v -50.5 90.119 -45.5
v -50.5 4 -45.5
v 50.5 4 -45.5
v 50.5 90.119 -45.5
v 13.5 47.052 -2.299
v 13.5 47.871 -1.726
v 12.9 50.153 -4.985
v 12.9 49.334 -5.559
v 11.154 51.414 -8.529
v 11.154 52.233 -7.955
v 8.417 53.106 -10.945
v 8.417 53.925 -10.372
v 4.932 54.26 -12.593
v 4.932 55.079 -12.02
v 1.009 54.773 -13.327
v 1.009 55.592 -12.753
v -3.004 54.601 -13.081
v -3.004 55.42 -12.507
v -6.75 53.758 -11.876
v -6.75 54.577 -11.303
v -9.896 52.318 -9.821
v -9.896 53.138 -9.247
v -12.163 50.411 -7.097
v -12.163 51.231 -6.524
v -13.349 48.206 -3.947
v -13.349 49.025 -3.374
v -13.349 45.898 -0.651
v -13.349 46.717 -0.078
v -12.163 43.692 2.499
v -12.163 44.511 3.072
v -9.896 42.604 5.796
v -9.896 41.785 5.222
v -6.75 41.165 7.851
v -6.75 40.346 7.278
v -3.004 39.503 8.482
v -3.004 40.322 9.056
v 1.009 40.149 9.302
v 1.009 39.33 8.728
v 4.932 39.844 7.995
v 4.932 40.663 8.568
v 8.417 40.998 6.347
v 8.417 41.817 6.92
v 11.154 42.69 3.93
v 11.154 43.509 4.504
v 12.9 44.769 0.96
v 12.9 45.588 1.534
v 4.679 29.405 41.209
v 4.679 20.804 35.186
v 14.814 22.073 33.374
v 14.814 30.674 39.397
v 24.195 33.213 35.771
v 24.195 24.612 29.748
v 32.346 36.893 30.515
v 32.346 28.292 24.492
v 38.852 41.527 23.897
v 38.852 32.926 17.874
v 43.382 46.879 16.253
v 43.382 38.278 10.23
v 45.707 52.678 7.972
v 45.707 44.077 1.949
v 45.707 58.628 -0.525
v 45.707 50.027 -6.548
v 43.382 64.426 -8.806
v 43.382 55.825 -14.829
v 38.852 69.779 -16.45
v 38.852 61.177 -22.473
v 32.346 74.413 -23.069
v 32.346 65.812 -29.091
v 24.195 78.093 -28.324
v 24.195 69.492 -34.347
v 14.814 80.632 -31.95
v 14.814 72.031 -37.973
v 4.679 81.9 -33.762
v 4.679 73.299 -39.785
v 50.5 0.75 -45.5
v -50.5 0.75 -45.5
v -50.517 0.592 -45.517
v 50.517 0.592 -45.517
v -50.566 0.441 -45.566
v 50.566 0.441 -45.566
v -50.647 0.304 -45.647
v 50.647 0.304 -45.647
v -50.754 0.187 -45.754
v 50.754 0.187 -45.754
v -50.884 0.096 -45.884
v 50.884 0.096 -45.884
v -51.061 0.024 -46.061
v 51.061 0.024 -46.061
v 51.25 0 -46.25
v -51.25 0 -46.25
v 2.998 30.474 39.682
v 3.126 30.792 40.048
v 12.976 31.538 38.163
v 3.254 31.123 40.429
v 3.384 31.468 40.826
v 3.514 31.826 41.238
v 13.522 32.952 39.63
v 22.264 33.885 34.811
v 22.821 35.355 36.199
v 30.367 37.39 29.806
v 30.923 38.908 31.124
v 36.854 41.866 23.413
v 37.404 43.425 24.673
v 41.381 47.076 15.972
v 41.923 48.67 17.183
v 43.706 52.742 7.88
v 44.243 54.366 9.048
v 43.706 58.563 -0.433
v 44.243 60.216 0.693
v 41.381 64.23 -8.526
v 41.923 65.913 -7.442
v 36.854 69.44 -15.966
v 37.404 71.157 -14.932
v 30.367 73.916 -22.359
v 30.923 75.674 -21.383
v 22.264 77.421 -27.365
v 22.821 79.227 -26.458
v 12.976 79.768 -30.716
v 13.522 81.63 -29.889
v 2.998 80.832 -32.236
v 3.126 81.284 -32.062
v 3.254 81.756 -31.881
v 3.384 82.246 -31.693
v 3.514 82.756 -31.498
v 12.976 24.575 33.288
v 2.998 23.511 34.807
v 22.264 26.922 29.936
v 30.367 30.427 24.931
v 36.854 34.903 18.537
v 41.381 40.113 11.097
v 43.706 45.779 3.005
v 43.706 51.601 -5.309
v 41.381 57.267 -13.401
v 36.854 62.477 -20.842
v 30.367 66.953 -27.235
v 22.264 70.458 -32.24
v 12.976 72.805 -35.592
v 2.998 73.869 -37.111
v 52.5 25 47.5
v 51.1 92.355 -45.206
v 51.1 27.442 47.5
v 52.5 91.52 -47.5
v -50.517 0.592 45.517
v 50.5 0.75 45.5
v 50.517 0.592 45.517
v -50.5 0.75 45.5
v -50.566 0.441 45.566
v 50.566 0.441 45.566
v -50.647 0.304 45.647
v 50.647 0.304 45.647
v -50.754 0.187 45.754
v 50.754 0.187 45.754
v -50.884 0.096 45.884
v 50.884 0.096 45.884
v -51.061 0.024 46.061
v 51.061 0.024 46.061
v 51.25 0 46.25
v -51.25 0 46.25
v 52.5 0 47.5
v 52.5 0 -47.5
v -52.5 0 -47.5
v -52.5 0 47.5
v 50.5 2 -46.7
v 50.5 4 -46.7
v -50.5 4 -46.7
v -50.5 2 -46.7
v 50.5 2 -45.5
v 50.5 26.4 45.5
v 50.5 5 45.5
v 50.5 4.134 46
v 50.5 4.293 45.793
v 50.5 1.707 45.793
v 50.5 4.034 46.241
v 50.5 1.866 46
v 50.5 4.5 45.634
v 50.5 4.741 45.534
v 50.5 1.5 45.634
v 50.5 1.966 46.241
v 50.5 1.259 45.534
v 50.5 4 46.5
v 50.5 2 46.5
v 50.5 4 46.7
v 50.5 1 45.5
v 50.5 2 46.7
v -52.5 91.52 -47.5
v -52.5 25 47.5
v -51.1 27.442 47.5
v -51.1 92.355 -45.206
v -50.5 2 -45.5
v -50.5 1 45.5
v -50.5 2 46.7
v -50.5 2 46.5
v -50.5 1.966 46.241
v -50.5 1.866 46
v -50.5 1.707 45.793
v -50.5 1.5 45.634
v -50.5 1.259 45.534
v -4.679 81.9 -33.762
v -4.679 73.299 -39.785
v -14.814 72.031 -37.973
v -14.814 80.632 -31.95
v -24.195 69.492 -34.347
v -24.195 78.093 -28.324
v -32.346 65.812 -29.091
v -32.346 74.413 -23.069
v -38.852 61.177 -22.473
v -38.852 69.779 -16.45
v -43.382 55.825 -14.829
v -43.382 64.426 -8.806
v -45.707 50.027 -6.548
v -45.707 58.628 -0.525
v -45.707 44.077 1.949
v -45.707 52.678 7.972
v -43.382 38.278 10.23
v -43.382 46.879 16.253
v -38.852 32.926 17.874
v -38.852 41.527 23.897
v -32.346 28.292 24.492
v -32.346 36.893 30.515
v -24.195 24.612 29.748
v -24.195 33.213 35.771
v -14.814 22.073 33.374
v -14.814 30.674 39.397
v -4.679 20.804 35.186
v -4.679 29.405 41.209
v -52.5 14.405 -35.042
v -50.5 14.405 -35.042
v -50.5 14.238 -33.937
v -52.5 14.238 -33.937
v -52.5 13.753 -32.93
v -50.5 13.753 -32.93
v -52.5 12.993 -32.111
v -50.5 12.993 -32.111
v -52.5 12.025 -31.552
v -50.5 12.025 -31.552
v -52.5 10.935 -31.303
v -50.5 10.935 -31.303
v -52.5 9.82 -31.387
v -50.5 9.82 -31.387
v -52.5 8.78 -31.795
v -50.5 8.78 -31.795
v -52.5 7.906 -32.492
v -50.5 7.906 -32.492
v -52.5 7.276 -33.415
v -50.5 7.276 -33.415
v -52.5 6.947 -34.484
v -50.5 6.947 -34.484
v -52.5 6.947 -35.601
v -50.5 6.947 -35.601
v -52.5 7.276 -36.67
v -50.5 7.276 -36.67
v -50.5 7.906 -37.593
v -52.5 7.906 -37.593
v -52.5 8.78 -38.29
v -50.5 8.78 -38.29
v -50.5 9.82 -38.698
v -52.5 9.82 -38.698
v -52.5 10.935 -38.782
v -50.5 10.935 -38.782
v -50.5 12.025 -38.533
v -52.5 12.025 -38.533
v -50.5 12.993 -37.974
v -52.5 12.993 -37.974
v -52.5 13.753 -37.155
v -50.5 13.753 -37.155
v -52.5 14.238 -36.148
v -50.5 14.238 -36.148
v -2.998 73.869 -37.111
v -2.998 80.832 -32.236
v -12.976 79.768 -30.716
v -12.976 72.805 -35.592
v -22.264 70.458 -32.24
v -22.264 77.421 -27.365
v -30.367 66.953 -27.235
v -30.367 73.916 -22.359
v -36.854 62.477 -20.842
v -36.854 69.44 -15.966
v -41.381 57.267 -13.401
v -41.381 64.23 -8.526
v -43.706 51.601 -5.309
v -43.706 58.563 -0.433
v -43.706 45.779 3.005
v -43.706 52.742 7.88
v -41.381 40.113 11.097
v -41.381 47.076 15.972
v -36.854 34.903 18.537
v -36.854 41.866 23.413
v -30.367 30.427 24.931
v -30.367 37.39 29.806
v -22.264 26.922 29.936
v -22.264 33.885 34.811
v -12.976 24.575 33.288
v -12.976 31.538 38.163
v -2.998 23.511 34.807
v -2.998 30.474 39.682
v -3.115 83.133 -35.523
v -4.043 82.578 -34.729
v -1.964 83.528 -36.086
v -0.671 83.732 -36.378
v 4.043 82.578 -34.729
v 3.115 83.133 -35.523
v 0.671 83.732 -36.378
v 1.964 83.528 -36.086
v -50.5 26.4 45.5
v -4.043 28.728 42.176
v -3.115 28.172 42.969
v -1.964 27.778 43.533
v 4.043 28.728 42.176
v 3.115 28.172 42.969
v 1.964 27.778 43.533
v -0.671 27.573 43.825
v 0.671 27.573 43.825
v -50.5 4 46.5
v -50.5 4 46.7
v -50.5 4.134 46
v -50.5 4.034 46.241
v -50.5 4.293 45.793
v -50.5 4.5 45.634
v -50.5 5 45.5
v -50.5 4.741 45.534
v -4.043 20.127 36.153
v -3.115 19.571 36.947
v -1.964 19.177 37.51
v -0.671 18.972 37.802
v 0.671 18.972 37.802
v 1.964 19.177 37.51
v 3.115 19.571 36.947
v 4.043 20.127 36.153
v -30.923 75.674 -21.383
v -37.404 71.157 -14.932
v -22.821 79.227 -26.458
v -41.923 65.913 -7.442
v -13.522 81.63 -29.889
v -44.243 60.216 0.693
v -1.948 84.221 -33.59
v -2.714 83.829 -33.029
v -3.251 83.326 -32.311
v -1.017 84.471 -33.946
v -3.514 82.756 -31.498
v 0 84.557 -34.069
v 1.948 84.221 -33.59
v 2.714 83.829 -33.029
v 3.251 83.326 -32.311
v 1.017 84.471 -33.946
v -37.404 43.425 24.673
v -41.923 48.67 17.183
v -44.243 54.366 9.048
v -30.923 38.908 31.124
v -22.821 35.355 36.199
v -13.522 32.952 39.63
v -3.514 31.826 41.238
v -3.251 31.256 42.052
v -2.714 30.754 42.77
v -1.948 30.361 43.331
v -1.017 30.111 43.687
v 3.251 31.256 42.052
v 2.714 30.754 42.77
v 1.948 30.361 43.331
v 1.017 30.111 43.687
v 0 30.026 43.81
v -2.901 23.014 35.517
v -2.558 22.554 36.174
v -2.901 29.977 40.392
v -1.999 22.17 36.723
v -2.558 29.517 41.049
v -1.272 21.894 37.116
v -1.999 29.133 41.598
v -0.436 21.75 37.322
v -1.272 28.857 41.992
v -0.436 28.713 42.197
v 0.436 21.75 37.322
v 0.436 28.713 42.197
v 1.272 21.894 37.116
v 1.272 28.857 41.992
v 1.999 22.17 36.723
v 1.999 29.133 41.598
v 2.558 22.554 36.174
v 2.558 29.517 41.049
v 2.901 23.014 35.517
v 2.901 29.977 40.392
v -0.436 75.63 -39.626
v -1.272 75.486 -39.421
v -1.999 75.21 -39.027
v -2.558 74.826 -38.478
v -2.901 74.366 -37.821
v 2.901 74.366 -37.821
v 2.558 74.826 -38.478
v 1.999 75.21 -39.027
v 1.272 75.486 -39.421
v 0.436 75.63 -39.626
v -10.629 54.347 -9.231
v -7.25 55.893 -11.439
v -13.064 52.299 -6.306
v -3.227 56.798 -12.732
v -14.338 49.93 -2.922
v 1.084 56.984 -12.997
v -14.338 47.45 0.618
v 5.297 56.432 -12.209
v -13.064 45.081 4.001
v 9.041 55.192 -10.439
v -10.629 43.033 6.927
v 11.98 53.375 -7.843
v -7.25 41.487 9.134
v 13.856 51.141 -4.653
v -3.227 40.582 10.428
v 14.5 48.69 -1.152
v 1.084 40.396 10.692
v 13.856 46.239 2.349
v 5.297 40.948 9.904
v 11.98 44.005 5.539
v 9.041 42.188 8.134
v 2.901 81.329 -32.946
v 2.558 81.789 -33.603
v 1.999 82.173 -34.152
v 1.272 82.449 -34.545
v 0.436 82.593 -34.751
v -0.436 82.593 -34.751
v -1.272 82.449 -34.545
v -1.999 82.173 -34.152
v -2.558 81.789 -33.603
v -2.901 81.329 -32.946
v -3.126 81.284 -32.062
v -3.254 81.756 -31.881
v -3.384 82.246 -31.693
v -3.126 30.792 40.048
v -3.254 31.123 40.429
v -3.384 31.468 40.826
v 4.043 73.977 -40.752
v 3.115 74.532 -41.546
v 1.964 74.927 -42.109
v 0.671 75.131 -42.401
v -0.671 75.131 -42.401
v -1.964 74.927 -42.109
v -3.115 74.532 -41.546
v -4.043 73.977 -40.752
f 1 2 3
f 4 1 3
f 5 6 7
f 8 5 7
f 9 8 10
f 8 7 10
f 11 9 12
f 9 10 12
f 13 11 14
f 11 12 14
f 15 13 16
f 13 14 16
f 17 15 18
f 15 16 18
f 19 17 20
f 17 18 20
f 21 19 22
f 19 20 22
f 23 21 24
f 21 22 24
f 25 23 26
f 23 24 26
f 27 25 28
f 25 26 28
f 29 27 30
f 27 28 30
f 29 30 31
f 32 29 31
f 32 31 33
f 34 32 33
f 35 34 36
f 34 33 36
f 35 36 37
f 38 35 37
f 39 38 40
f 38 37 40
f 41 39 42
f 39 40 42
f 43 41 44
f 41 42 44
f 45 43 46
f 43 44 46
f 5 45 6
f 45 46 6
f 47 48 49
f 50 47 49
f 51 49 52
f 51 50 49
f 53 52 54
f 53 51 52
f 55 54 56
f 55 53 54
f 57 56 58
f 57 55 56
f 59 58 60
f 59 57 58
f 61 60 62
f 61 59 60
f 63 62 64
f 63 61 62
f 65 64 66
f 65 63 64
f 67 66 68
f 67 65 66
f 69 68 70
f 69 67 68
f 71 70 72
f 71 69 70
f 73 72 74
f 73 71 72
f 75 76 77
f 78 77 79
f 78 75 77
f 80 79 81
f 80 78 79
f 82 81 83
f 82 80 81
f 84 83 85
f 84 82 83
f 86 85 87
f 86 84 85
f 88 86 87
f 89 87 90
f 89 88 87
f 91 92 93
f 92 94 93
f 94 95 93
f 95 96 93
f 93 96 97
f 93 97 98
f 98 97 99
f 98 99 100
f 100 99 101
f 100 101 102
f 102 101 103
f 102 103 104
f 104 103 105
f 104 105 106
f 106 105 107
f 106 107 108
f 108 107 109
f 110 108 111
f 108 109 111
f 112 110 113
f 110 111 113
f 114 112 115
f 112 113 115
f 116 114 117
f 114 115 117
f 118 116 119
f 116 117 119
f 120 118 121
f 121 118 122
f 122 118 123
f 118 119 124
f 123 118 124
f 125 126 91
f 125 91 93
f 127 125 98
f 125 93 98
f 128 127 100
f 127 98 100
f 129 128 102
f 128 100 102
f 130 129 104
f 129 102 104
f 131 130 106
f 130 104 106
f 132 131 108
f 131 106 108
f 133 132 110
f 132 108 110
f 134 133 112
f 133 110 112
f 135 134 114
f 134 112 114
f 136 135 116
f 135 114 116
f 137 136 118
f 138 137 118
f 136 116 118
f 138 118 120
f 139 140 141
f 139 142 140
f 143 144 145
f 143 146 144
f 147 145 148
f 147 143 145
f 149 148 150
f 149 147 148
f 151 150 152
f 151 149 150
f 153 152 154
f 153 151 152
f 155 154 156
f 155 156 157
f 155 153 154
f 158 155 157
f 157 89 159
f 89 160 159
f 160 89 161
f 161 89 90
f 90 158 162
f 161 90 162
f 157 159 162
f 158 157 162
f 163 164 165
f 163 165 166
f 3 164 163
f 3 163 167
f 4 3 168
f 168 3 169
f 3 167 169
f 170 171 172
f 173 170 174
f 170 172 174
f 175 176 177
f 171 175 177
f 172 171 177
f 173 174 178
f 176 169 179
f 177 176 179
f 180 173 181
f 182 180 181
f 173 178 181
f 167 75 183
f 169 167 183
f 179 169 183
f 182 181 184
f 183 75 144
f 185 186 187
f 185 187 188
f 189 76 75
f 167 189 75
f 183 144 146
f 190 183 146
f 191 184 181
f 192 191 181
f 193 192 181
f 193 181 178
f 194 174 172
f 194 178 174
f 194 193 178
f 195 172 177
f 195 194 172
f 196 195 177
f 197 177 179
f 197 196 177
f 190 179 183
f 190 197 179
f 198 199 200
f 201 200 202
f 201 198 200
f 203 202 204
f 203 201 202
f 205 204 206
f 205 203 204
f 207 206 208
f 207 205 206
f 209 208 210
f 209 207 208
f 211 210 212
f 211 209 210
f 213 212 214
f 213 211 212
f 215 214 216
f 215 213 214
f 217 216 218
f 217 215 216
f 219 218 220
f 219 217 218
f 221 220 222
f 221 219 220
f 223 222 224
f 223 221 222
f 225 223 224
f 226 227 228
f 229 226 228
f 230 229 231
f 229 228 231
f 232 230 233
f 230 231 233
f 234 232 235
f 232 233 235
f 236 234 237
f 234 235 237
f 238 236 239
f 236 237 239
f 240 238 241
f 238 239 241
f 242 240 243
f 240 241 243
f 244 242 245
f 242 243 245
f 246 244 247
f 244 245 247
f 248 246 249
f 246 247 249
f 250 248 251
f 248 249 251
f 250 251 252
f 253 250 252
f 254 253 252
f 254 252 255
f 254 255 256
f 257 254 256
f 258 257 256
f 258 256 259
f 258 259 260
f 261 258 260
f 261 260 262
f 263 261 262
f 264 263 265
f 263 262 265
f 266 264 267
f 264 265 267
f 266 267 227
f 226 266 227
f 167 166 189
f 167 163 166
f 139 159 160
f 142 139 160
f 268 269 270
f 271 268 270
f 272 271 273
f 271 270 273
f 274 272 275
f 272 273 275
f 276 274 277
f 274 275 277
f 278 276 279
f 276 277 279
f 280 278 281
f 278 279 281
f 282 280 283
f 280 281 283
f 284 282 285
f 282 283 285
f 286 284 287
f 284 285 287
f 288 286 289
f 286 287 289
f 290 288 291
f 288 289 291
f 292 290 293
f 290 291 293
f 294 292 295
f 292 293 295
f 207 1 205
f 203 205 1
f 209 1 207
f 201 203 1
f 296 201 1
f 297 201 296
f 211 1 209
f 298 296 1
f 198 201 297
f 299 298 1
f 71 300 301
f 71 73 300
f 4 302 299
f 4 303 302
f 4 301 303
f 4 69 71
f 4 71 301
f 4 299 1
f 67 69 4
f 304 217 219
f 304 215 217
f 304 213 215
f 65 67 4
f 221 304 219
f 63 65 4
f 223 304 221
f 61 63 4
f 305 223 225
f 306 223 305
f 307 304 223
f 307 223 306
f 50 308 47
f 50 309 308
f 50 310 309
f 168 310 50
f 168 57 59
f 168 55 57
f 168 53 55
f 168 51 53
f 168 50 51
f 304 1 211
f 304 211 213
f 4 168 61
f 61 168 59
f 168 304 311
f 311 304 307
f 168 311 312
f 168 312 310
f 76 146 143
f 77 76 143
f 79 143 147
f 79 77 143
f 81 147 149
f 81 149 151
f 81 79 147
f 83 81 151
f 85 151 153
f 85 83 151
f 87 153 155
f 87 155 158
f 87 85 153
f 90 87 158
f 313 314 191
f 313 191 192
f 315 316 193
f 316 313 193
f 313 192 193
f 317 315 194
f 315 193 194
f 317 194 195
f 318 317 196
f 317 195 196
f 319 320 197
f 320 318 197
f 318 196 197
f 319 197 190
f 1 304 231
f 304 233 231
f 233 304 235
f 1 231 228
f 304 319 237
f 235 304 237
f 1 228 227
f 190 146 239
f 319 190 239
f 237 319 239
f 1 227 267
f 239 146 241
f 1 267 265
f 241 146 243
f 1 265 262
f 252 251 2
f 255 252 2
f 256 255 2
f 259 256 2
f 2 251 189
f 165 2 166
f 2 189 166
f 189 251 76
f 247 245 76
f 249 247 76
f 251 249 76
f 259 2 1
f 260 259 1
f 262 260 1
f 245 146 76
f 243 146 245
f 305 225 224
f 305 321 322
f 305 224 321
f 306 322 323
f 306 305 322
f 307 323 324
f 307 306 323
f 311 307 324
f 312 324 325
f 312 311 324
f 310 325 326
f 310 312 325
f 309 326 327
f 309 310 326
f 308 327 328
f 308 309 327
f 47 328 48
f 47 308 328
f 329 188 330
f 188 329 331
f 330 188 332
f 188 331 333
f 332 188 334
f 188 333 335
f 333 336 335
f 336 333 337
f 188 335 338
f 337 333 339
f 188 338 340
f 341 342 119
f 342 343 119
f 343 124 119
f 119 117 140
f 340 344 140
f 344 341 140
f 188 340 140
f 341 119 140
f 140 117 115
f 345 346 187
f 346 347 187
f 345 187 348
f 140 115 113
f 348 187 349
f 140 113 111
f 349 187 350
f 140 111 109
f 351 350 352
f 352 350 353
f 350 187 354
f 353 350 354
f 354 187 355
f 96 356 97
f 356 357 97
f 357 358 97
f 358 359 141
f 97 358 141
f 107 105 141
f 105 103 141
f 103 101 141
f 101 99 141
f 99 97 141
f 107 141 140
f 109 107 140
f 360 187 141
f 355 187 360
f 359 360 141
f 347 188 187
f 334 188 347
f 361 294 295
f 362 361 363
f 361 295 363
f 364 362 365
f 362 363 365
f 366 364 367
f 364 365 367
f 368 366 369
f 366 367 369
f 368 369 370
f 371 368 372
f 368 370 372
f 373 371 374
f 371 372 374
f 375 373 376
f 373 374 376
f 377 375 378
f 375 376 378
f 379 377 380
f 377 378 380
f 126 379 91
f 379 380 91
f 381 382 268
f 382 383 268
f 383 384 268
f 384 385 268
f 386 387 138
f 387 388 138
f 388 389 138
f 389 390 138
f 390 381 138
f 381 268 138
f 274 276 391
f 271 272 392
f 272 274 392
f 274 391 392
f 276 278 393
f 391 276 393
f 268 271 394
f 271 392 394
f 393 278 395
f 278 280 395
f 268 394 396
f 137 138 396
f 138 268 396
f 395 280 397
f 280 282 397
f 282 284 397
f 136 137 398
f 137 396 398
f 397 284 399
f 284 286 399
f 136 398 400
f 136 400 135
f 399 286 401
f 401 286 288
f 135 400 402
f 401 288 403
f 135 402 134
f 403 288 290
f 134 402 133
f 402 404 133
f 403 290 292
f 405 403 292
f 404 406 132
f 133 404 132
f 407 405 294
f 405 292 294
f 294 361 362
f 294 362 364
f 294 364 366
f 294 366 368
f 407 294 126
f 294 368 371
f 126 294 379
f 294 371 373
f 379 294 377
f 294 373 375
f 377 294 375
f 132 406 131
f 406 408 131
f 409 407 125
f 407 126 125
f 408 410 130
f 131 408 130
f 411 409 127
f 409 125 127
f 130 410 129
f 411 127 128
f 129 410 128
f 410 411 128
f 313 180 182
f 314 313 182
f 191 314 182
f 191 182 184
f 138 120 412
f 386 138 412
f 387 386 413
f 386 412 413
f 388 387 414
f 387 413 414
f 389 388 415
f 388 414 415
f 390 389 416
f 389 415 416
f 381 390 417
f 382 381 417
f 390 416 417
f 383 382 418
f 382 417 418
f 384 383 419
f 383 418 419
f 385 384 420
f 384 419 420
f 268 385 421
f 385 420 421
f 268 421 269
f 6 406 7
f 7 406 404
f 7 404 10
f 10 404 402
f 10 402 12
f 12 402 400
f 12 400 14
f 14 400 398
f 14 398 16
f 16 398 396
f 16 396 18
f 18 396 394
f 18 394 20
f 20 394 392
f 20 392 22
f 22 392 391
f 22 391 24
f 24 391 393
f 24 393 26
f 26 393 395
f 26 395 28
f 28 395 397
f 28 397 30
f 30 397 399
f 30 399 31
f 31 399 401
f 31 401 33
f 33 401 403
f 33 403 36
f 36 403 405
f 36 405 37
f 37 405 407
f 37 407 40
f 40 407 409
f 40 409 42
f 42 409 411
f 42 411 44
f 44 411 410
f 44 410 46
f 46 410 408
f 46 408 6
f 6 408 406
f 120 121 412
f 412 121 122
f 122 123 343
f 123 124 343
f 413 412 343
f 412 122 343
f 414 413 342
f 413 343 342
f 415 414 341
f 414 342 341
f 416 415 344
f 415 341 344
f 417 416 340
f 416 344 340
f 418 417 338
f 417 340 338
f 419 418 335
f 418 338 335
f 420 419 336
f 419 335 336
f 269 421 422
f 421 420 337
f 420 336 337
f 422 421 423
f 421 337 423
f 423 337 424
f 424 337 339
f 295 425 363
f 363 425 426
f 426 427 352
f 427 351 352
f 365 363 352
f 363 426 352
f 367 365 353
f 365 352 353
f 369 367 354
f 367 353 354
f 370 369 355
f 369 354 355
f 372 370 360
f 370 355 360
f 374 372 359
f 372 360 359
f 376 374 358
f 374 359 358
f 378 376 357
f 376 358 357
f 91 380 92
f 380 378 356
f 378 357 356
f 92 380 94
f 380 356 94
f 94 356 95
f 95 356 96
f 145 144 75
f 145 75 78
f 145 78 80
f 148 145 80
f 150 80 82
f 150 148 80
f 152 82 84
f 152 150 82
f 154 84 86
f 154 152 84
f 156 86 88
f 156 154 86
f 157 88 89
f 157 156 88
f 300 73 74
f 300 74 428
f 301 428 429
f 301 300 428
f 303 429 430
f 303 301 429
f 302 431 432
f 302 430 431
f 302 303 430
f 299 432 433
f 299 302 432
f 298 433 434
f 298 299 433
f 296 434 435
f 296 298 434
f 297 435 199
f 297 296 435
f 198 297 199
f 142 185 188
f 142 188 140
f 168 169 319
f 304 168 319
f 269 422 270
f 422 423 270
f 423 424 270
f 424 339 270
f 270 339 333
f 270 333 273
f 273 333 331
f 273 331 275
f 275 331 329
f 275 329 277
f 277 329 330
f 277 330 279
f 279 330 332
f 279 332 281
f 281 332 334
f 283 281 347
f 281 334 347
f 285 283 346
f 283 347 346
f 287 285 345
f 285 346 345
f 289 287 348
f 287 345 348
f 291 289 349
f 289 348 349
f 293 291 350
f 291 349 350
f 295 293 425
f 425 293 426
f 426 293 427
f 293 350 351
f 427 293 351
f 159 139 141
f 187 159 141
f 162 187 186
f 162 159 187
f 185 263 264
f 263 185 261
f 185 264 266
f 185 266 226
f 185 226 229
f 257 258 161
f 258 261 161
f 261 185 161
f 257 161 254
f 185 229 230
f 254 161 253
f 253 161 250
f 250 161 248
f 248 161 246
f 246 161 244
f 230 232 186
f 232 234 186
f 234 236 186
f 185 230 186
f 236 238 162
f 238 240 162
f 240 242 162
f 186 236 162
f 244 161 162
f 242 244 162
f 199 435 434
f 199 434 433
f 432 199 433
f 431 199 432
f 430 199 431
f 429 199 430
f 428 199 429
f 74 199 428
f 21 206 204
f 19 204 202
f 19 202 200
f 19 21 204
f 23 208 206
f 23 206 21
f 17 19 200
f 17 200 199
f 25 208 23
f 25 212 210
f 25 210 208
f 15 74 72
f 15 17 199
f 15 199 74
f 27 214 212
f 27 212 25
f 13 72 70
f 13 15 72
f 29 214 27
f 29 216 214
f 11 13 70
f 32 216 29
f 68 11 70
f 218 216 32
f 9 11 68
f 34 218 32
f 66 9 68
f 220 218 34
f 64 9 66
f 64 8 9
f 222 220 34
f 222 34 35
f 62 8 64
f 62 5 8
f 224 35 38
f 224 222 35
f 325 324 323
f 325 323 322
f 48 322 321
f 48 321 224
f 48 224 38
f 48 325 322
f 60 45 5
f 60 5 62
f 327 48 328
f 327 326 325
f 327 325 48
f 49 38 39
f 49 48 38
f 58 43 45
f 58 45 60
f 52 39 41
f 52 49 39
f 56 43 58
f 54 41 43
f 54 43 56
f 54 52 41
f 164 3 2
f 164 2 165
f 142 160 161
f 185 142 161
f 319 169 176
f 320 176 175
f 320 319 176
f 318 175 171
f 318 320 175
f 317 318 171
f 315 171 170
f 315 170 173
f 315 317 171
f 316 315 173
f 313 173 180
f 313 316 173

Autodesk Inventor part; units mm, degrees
ref_plane "YZ Plane" through (0, 0, 0) normal (1, 0, 0) x (0, 1, 0)
ref_plane "XZ Plane" through (0, 0, 0) normal (0, 1, 0) x (-1, 0, 0)
sketch "XZ_master" plane through (0, 0, 0) normal (0, 1, 0) x (-1, 0, 0)
  line L0 (52.5, -47.5) -> (-52.5, -47.5)
  line L1 (-52.5, -47.5) -> (-52.5, 47.5)
  line L2 (-52.5, 47.5) -> (52.5, 47.5)
  line L3 (52.5, 47.5) -> (52.5, -47.5)
  line L4 (52.5, -47.5) -> (-52.5, 47.5) construction
  line L5 (-52.5, -47.5) -> (52.5, 47.5) construction
  line L6 (50.5, -45.5) -> (-50.5, -45.5)
  line L7 (-50.5, -45.5) -> (-50.5, 45.5)
  line L8 (-50.5, 45.5) -> (50.5, 45.5)
  line L9 (50.5, 45.5) -> (50.5, -45.5)
  point P0 (0, 0)
  dimension "d0" = 105
  dimension "d1" = 95
  dimension "d2" = 2
sketch "XZ_master outline for Walls_bottom" plane through (0, 0, 0) normal (0, 1, 0) x (-1, 0, 0)
  line L0 (52.5, -47.5) -> (52.5, 47.5)
  line L1 (-52.5, -47.5) -> (52.5, -47.5)
  line L2 (52.5, 47.5) -> (-52.5, 47.5)
  line L3 (-52.5, 47.5) -> (-52.5, -47.5)
  line L4 (50.5, -45.5) -> (-50.5, -45.5)
  line L5 (50.5, 45.5) -> (50.5, -45.5)
  line L6 (-50.5, 45.5) -> (50.5, 45.5)
  line L7 (-50.5, -45.5) -> (-50.5, 45.5)
extrude "Walls_bottom" add sketch "XZ_master outline for Walls_bottom" along normal blind 25
fillet "Fillet2" radius 0.75 4 edges at (0, 0, 45.5) (50.5, 0, 0) (-50.5, 0, 0) (0, 0, -45.5)
sketch "Profile" plane through (0, 0, 0) normal (1, 0, 0) x (0, 1, 0)
  line L0 (0, 45.5) -> (25, 45.5)
  line L1 (2, 45.5) -> (4, 45.5)
  line L2 (4, 45.5) -> (4, 46.7)
  line L3 (4, 46.7) -> (2, 46.7)
  line L4 (2, 46.7) -> (2, 45.5)
  line L5 (0, -47.5) -> (0, 47.5)
  circle A0 centre (10.654636, -35.042492) radius 3.75
  line L6 (4, 46.7) -> (4, -38.2) construction
  line L7 (4, 46.7) -> (88.9, 46.7) construction
  point P0 (0, 0)
  dimension "d5" = 2
  dimension "d6" = 1.2
  dimension "d7" = 2
  dimension "d27" = 7.5
  dimension "d30" = 90
sketch "Profile outline for Lip recess" plane through (0, 0, 0) normal (1, 0, 0) x (0, 1, 0)
  line L0 (4, 46.7) -> (2, 46.7)
  line L1 (4, 45.5) -> (4, 46.7)
  line L2 (2, 45.5) -> (4, 45.5)
  line L3 (2, 46.7) -> (2, 45.5)
extrude "Lip recess" cut sketch "Profile outline for Lip recess" along normal mid plane 101
fillet "Lip_fillet" radius 1 2 edges at (0, 4, 45.5) (0, 2, 45.5)
pattern_circular "Circular Pattern1" count 2 over 360 about axis through (0, -10, 0) along (0, 1, 0) of "Lip recess"
ref_plane "Angled_top_face" through (-52.5, 25, 47.5) normal (0, -0.819152, -0.5735764) x (1, 0, 0)
sketch "XZ_master outline for Walls_to_workplane" plane through (0, 0, 0) normal (0, 1, 0) x (-1, 0, 0)
  line L0 (52.5, -47.5) -> (52.5, 47.5)
  line L1 (-52.5, -47.5) -> (52.5, -47.5)
  line L2 (52.5, 47.5) -> (-52.5, 47.5)
  line L3 (-52.5, 47.5) -> (-52.5, -47.5)
  line L4 (50.5, -45.5) -> (-50.5, -45.5)
  line L5 (50.5, 45.5) -> (50.5, -45.5)
  line L6 (-50.5, 45.5) -> (50.5, 45.5)
  line L7 (-50.5, -45.5) -> (-50.5, 45.5)
extrude "Walls_to_workplane" add sketch "XZ_master outline for Walls_to_workplane" along normal up to surface from surface at 25 surface through (-52.5, 25, 47.5) normal (0, -0.819152, -0.5735764)
sketch "Top_face" plane through (-52.5, 25, 47.5) normal (0, -0.819152, -0.5735764) x (1, 0, 0)
  line L0 (105, -115.973586) -> (0, -115.973586)
  line L1 (0, 0) -> (105, 0)
  line L2 (105, 0) -> (105, -115.973586)
  line L3 (105, -115.973586) -> (0, -115.973586)
  line L4 (0, -115.973586) -> (0, 0)
  line L5 (0, -115.973586) -> (0, 0) construction
  line L6 (2, -2.441549) -> (2, -113.532037)
  line L7 (2, -113.532037) -> (103, -113.532037)
  line L8 (103, -113.532037) -> (103, -2.441549)
  line L9 (103, -2.441549) -> (2, -2.441549)
  line L10 (105, 0) -> (105, -115.973586)
  line L11 (105, -115.973586) -> (0, -115.973586)
  line L12 (0, -115.973586) -> (0, 0)
  line L13 (0, 0) -> (105, 0)
  line L14 (2, -113.532037) -> (103, -113.532037) construction
  line L15 (52.5, -113.532037) -> (52.5, -2.441549) construction
  line L16 (103, -2.441549) -> (2, -2.441549) construction
  circle A0 centre (52.5, -53.441549) radius 44
  circle A1 centre (52.5, -97.441549) radius 3
  circle A2 centre (52.5, -9.441549) radius 3
  circle A3 centre (52.5, -53.441549) radius 46
  circle A4 centre (52.5, -97.441549) radius 5
  circle A5 centre (52.5, -9.441549) radius 5
  circle A6 centre (52.5, -53.441549) radius 13.5
  circle A7 centre (52.5, -53.441549) radius 51 construction
  point P0 (55.498256, -97.339276)
  point P1 (55.498256, -9.543822)
  point P2 (49.501744, -9.543822)
  point P3 (49.501744, -97.339276)
  point P4 (47.820513, -99.202913)
  point P5 (57.179487, -99.202913)
  point P6 (57.179487, -7.680186)
  point P7 (47.820513, -7.680186)
  dimension "d61" = 88
  dimension "d62" = 51
  dimension "d63" = 6
  dimension "d64" = 6
  dimension "d65" = 2
  dimension "d66" = 2
  dimension "d67" = 2
  dimension "d68" = 27
  dimension "d69" = 102
sketch "Top_face outline for Face" plane through (-52.5, 25, 47.5) normal (0, -0.819152, -0.5735764) x (1, 0, 0)
  line L0 (105, -115.973586) -> (105, 0)
  line L1 (0, -115.973586) -> (105, -115.973586)
  line L2 (0, 0) -> (0, -115.973586)
  line L3 (105, 0) -> (0, 0)
extrude "Face" add sketch "Top_face outline for Face" against normal blind 2 draft -35
sketch "Top_face outline for Button_recess" plane through (-52.5, 25, 47.5) normal (0, -0.819152, -0.5735764) x (1, 0, 0)
  arc A0 (49.501744, -97.339276) -> (55.498256, -97.339276) centre (52.5, -97.441549) ccw
  arc A1 (49.501744, -9.543822) -> (49.501744, -97.339276) centre (52.5, -53.441549) ccw
  arc A2 (55.498256, -9.543822) -> (49.501744, -9.543822) centre (52.5, -9.441549) ccw
  arc A3 (55.498256, -97.339276) -> (55.498256, -9.543822) centre (52.5, -53.441549) ccw
extrude "Button_recess" cut sketch "Top_face outline for Button_recess" against normal through all draft 15
sketch "Profile outline for Side_cable_cutout" plane through (0, 0, 0) normal (1, 0, 0) x (0, 1, 0)
  circle A0 centre (10.654636, -35.042492) radius 3.75
extrude "Side_cable_cutout" cut sketch "Profile outline for Side_cable_cutout" against normal through all
sketch "Top_face outline for Recess_walls" plane through (-52.5, 25, 47.5) normal (0, -0.819152, -0.5735764) x (1, 0, 0)
  arc A0 (47.820513, -99.202913) -> (57.179487, -99.202913) centre (52.5, -97.441549) ccw
  arc A1 (47.820513, -7.680186) -> (47.820513, -99.202913) centre (52.5, -53.441549) ccw
  arc A2 (57.179487, -99.202913) -> (57.179487, -7.680186) centre (52.5, -53.441549) ccw
  arc A3 (57.179487, -7.680186) -> (47.820513, -7.680186) centre (52.5, -9.441549) ccw
  arc A4 (55.498256, -97.339276) -> (49.501744, -97.339276) centre (52.5, -97.441549) cw
  arc A5 (55.498256, -9.543822) -> (55.498256, -97.339276) centre (52.5, -53.441549) cw
  arc A6 (49.501744, -9.543822) -> (55.498256, -9.543822) centre (52.5, -9.441549) cw
  arc A7 (49.501744, -97.339276) -> (49.501744, -9.543822) centre (52.5, -53.441549) cw
extrude "Recess_walls" add sketch "Top_face outline for Recess_walls" along normal blind 8.5
sketch "Top_face outline for Recess_floor" plane through (-52.5, 25, 47.5) normal (0, -0.819152, -0.5735764) x (1, 0, 0)
  arc A0 (47.820513, -99.202913) -> (57.179487, -99.202913) centre (52.5, -97.441549) ccw
  arc A1 (47.820513, -7.680186) -> (47.820513, -99.202913) centre (52.5, -53.441549) ccw
  arc A2 (57.179487, -99.202913) -> (57.179487, -7.680186) centre (52.5, -53.441549) ccw
  arc A3 (57.179487, -7.680186) -> (47.820513, -7.680186) centre (52.5, -9.441549) ccw
  circle A4 centre (52.5, -53.441549) radius 13.5
extrude "Recess_floor" add sketch "Top_face outline for Recess_floor" along normal blind 2 from surface at 8.5
chamfer "Button_cutout_chamfer" distance 1 angle 45 1 edges at (-13.5, 48.69, -1.1522)
properties part number "BARB_top" material "ABS Plastic"
